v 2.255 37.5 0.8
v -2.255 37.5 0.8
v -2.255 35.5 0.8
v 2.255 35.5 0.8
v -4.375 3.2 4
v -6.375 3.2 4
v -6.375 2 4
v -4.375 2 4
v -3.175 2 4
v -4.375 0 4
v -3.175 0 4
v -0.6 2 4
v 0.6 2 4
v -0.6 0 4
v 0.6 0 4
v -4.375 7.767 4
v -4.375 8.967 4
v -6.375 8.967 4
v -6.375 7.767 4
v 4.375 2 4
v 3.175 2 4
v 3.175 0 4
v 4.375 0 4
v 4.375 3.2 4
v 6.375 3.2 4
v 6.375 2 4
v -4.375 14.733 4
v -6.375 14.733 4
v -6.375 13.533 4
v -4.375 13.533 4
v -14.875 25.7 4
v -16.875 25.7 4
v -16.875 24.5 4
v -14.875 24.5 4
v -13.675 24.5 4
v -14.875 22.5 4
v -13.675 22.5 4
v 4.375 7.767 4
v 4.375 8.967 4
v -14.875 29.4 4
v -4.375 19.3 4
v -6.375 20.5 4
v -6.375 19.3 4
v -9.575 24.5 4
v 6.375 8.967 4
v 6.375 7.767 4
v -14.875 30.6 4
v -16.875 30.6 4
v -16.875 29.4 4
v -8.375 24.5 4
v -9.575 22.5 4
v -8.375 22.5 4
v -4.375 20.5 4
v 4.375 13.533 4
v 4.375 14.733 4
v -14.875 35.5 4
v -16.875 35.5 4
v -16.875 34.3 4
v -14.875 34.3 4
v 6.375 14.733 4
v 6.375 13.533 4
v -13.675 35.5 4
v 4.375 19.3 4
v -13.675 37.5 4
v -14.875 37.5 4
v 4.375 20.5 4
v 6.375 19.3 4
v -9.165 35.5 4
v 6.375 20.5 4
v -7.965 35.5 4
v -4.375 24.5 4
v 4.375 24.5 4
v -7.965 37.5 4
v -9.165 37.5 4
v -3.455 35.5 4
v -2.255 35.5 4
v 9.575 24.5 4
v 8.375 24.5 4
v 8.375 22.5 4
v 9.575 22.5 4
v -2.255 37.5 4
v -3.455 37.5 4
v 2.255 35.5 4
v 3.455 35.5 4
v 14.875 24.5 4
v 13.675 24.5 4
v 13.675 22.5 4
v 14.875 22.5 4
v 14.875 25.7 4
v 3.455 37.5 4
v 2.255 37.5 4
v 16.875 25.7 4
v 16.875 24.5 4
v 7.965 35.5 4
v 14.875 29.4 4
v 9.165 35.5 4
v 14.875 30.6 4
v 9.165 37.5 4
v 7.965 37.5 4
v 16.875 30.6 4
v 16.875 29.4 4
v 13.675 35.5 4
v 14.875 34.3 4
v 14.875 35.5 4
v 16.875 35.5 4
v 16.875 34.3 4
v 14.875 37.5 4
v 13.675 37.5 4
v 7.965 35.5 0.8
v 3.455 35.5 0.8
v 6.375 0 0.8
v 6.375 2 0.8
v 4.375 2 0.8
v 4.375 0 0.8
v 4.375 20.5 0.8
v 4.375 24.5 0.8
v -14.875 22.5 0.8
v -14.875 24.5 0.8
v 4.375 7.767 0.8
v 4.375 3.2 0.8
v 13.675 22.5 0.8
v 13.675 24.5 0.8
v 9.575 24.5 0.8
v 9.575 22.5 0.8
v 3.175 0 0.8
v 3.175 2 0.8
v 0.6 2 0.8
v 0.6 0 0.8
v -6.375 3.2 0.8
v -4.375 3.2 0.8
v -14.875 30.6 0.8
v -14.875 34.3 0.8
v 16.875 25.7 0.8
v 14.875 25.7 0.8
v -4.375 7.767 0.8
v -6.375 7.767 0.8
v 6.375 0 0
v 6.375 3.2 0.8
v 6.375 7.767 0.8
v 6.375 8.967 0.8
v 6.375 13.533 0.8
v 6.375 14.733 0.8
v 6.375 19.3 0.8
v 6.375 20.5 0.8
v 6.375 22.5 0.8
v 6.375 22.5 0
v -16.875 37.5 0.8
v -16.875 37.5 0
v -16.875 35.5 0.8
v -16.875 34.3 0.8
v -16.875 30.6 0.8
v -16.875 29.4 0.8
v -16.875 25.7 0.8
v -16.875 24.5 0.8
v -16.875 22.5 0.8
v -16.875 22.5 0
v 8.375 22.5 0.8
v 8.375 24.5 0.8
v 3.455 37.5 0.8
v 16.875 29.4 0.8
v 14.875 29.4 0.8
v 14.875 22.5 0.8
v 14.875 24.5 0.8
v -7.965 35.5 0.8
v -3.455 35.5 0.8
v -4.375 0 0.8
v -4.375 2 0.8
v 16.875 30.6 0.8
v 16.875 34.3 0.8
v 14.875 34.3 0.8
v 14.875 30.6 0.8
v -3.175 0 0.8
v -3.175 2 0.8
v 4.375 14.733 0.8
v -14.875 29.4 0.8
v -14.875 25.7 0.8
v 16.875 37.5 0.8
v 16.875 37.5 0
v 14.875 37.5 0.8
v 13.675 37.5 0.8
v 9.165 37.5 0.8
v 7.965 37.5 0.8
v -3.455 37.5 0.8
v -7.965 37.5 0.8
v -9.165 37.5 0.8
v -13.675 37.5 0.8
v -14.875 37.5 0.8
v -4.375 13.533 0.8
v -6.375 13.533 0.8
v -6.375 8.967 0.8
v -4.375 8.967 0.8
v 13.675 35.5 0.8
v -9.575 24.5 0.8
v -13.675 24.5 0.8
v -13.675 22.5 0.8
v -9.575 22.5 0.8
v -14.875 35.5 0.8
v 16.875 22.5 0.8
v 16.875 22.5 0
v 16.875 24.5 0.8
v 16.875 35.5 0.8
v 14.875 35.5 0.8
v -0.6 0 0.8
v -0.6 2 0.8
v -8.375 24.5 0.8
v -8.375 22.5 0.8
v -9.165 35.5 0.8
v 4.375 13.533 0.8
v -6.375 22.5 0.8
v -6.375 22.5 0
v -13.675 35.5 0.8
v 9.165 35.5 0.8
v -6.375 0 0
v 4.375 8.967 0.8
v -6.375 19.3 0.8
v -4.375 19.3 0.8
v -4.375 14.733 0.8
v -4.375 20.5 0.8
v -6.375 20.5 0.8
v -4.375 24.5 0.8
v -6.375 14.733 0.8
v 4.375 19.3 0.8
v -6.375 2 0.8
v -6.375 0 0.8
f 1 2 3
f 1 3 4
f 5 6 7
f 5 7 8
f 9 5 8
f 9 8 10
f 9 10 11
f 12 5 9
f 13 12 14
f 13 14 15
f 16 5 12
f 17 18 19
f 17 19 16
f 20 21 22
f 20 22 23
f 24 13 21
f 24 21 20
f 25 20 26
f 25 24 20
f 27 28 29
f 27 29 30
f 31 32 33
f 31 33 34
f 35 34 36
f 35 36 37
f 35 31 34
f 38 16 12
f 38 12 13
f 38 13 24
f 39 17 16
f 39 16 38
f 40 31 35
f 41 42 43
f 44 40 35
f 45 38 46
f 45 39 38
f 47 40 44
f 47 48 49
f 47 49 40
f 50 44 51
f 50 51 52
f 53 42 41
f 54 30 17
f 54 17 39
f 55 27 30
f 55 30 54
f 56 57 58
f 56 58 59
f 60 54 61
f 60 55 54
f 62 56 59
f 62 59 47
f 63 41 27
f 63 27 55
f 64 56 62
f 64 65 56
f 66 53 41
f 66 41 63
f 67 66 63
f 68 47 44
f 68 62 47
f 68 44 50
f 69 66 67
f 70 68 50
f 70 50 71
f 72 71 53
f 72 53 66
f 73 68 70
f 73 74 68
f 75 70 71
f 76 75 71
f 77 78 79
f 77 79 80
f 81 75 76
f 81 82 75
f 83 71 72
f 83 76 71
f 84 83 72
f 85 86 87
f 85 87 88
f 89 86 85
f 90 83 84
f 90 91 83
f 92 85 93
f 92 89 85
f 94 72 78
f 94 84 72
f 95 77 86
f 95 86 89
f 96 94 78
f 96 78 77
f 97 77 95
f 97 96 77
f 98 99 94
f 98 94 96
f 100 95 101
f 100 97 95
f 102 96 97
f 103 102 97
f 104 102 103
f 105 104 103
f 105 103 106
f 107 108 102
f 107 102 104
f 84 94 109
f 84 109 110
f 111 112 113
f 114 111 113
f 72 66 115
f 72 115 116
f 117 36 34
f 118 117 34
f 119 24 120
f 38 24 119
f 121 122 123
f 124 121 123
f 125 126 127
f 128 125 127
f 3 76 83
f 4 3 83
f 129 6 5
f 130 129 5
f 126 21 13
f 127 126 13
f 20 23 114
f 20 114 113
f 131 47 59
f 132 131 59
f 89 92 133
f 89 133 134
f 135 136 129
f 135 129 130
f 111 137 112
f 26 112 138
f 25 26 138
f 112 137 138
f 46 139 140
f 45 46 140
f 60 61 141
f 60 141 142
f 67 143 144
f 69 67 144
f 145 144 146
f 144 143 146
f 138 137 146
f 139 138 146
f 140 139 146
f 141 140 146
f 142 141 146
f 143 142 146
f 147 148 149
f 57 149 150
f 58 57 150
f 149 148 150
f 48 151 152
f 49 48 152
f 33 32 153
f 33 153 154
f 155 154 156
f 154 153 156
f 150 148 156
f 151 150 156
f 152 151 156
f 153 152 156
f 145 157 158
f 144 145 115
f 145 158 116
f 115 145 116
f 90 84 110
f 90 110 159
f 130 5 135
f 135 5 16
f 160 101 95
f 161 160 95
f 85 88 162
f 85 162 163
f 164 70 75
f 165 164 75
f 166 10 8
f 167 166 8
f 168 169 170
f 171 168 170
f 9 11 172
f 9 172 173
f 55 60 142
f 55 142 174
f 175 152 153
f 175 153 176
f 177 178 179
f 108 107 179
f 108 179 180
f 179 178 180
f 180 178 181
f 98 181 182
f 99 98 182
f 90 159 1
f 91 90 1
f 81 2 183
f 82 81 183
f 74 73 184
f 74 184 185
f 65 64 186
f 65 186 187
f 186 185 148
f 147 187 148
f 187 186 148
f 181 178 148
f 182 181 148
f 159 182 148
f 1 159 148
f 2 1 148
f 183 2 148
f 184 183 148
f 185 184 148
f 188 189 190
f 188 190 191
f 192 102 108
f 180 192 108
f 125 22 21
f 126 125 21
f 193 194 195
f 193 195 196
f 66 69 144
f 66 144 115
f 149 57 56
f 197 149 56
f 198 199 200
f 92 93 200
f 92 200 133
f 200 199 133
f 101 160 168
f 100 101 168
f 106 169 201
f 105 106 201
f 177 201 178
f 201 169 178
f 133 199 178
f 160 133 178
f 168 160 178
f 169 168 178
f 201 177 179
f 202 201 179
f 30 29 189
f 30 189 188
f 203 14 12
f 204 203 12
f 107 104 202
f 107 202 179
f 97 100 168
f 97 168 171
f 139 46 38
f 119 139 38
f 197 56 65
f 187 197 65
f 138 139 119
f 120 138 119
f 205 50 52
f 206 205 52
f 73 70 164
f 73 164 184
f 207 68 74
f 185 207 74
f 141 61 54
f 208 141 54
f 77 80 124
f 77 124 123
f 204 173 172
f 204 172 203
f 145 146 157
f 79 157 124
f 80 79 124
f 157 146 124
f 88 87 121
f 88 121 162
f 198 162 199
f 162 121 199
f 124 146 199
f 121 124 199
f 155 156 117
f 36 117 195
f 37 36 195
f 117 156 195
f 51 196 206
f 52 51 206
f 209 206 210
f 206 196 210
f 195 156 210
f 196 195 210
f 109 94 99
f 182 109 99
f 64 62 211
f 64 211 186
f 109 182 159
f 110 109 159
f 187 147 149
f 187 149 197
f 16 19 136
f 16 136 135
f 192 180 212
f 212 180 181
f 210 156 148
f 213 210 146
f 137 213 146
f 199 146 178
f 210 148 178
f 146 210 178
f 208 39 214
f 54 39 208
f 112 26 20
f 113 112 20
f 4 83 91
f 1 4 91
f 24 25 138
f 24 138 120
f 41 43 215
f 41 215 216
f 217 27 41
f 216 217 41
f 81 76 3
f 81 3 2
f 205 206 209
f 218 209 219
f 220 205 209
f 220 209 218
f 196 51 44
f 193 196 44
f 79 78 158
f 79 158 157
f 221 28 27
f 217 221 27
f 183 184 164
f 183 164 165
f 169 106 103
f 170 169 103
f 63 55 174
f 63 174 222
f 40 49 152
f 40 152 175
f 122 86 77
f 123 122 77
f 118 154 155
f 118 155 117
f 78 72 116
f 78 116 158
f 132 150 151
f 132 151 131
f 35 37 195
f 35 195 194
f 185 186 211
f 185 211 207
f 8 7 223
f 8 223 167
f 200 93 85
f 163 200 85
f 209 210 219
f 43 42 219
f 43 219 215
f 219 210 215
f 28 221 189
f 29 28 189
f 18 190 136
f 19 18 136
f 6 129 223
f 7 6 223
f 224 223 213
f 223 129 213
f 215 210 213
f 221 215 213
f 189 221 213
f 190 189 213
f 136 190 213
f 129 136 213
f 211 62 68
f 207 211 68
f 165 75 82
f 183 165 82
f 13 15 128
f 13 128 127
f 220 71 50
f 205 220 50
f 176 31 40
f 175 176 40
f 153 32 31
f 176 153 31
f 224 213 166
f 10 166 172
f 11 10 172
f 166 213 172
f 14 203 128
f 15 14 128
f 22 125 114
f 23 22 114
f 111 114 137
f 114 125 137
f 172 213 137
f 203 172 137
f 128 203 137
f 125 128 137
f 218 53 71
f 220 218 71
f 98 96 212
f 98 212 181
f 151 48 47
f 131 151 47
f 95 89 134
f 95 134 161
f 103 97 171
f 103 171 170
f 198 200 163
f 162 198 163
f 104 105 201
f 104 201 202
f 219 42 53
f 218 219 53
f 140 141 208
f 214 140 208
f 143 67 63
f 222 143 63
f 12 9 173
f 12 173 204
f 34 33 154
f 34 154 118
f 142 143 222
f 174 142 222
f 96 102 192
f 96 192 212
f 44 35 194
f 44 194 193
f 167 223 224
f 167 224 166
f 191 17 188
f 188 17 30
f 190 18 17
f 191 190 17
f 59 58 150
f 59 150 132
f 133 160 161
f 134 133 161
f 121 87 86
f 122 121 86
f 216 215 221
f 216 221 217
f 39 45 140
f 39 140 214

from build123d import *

# Parameters (mm, degrees)
F1_DEPTH = 4
F2_W     = 4.1
F2_H     = 2
F2_W_2   = 2
F2_H_2   = 3.7
F2_W_3   = 4.51
F2_W_4   = 2.255
F2_H_3   = 4.566667
F2_H_4   = 4.566666
F2_W_5   = 2.575
F3_DEPTH = 3.2


with BuildPart() as f1:
    # F0 (on Top) → F1 (new body)
    with BuildSketch(Plane.XY):
        Polygon((-16.875, 22.5), (-6.375, 22.5), (-6.375, 0), (6.375, 0), (6.375, 22.5), (16.875, 22.5), (16.875, 37.5), (-16.875, 37.5), align=None)
    extrude(amount=F1_DEPTH)


with BuildPart() as f3:
    # F2 (on face) → F3 (new body)
    with BuildSketch(Plane.XY.offset(4)):
        with Locations((-11.625, 23.5)):
            Rectangle(F2_W, F2_H)
        with Locations((-15.875, 23.5)):
            Rectangle(F2_W_2, F2_H)
        with Locations((-15.875, 27.55)):
            Rectangle(F2_W_2, F2_H_2)
        with Locations((-15.875, 32.45)):
            Rectangle(F2_W_2, F2_H_2)
        with Locations((-11.42, 36.5)):
            Rectangle(F2_W_3, F2_H)
        with Locations((-5.71, 36.5)):
            Rectangle(F2_W_3, F2_H)
        with Locations((-1.1275, 36.5)):
            Rectangle(F2_W_4, F2_H)
        with Locations((-15.875, 36.5)):
            Rectangle(F2_W_2, F2_H)
        with Locations((-5.375, 17.016666)):
            Rectangle(F2_W_2, F2_H_3)
        with Locations((-5.375, 11.25)):
            Rectangle(F2_W_2, F2_H_4)
        with Locations((-5.375, 5.483333)):
            Rectangle(F2_W_2, F2_H_3)
        with Locations((-5.375, 1)):
            Rectangle(F2_W_2, F2_H)
        with Locations((-1.8875, 1)):
            Rectangle(F2_W_5, F2_H)
        Polygon((-8.375, 22.5), (-6.375, 22.5), (-6.375, 20.5), (-4.375, 20.5), (-4.375, 24.5), (-8.375, 24.5), align=None)
    extrude(amount=-F3_DEPTH)


with BuildPart() as f4_1:
    # F4: instance of F3
    add(f3.part.mirror(Plane.YZ))


with BuildPart() as f1_1:
    add(f1.part)

    # F5: cut F3, F4_1
    add(f3.part, mode=Mode.SUBTRACT)
    add(f4_1.part, mode=Mode.SUBTRACT)


solid = f1_1.part
